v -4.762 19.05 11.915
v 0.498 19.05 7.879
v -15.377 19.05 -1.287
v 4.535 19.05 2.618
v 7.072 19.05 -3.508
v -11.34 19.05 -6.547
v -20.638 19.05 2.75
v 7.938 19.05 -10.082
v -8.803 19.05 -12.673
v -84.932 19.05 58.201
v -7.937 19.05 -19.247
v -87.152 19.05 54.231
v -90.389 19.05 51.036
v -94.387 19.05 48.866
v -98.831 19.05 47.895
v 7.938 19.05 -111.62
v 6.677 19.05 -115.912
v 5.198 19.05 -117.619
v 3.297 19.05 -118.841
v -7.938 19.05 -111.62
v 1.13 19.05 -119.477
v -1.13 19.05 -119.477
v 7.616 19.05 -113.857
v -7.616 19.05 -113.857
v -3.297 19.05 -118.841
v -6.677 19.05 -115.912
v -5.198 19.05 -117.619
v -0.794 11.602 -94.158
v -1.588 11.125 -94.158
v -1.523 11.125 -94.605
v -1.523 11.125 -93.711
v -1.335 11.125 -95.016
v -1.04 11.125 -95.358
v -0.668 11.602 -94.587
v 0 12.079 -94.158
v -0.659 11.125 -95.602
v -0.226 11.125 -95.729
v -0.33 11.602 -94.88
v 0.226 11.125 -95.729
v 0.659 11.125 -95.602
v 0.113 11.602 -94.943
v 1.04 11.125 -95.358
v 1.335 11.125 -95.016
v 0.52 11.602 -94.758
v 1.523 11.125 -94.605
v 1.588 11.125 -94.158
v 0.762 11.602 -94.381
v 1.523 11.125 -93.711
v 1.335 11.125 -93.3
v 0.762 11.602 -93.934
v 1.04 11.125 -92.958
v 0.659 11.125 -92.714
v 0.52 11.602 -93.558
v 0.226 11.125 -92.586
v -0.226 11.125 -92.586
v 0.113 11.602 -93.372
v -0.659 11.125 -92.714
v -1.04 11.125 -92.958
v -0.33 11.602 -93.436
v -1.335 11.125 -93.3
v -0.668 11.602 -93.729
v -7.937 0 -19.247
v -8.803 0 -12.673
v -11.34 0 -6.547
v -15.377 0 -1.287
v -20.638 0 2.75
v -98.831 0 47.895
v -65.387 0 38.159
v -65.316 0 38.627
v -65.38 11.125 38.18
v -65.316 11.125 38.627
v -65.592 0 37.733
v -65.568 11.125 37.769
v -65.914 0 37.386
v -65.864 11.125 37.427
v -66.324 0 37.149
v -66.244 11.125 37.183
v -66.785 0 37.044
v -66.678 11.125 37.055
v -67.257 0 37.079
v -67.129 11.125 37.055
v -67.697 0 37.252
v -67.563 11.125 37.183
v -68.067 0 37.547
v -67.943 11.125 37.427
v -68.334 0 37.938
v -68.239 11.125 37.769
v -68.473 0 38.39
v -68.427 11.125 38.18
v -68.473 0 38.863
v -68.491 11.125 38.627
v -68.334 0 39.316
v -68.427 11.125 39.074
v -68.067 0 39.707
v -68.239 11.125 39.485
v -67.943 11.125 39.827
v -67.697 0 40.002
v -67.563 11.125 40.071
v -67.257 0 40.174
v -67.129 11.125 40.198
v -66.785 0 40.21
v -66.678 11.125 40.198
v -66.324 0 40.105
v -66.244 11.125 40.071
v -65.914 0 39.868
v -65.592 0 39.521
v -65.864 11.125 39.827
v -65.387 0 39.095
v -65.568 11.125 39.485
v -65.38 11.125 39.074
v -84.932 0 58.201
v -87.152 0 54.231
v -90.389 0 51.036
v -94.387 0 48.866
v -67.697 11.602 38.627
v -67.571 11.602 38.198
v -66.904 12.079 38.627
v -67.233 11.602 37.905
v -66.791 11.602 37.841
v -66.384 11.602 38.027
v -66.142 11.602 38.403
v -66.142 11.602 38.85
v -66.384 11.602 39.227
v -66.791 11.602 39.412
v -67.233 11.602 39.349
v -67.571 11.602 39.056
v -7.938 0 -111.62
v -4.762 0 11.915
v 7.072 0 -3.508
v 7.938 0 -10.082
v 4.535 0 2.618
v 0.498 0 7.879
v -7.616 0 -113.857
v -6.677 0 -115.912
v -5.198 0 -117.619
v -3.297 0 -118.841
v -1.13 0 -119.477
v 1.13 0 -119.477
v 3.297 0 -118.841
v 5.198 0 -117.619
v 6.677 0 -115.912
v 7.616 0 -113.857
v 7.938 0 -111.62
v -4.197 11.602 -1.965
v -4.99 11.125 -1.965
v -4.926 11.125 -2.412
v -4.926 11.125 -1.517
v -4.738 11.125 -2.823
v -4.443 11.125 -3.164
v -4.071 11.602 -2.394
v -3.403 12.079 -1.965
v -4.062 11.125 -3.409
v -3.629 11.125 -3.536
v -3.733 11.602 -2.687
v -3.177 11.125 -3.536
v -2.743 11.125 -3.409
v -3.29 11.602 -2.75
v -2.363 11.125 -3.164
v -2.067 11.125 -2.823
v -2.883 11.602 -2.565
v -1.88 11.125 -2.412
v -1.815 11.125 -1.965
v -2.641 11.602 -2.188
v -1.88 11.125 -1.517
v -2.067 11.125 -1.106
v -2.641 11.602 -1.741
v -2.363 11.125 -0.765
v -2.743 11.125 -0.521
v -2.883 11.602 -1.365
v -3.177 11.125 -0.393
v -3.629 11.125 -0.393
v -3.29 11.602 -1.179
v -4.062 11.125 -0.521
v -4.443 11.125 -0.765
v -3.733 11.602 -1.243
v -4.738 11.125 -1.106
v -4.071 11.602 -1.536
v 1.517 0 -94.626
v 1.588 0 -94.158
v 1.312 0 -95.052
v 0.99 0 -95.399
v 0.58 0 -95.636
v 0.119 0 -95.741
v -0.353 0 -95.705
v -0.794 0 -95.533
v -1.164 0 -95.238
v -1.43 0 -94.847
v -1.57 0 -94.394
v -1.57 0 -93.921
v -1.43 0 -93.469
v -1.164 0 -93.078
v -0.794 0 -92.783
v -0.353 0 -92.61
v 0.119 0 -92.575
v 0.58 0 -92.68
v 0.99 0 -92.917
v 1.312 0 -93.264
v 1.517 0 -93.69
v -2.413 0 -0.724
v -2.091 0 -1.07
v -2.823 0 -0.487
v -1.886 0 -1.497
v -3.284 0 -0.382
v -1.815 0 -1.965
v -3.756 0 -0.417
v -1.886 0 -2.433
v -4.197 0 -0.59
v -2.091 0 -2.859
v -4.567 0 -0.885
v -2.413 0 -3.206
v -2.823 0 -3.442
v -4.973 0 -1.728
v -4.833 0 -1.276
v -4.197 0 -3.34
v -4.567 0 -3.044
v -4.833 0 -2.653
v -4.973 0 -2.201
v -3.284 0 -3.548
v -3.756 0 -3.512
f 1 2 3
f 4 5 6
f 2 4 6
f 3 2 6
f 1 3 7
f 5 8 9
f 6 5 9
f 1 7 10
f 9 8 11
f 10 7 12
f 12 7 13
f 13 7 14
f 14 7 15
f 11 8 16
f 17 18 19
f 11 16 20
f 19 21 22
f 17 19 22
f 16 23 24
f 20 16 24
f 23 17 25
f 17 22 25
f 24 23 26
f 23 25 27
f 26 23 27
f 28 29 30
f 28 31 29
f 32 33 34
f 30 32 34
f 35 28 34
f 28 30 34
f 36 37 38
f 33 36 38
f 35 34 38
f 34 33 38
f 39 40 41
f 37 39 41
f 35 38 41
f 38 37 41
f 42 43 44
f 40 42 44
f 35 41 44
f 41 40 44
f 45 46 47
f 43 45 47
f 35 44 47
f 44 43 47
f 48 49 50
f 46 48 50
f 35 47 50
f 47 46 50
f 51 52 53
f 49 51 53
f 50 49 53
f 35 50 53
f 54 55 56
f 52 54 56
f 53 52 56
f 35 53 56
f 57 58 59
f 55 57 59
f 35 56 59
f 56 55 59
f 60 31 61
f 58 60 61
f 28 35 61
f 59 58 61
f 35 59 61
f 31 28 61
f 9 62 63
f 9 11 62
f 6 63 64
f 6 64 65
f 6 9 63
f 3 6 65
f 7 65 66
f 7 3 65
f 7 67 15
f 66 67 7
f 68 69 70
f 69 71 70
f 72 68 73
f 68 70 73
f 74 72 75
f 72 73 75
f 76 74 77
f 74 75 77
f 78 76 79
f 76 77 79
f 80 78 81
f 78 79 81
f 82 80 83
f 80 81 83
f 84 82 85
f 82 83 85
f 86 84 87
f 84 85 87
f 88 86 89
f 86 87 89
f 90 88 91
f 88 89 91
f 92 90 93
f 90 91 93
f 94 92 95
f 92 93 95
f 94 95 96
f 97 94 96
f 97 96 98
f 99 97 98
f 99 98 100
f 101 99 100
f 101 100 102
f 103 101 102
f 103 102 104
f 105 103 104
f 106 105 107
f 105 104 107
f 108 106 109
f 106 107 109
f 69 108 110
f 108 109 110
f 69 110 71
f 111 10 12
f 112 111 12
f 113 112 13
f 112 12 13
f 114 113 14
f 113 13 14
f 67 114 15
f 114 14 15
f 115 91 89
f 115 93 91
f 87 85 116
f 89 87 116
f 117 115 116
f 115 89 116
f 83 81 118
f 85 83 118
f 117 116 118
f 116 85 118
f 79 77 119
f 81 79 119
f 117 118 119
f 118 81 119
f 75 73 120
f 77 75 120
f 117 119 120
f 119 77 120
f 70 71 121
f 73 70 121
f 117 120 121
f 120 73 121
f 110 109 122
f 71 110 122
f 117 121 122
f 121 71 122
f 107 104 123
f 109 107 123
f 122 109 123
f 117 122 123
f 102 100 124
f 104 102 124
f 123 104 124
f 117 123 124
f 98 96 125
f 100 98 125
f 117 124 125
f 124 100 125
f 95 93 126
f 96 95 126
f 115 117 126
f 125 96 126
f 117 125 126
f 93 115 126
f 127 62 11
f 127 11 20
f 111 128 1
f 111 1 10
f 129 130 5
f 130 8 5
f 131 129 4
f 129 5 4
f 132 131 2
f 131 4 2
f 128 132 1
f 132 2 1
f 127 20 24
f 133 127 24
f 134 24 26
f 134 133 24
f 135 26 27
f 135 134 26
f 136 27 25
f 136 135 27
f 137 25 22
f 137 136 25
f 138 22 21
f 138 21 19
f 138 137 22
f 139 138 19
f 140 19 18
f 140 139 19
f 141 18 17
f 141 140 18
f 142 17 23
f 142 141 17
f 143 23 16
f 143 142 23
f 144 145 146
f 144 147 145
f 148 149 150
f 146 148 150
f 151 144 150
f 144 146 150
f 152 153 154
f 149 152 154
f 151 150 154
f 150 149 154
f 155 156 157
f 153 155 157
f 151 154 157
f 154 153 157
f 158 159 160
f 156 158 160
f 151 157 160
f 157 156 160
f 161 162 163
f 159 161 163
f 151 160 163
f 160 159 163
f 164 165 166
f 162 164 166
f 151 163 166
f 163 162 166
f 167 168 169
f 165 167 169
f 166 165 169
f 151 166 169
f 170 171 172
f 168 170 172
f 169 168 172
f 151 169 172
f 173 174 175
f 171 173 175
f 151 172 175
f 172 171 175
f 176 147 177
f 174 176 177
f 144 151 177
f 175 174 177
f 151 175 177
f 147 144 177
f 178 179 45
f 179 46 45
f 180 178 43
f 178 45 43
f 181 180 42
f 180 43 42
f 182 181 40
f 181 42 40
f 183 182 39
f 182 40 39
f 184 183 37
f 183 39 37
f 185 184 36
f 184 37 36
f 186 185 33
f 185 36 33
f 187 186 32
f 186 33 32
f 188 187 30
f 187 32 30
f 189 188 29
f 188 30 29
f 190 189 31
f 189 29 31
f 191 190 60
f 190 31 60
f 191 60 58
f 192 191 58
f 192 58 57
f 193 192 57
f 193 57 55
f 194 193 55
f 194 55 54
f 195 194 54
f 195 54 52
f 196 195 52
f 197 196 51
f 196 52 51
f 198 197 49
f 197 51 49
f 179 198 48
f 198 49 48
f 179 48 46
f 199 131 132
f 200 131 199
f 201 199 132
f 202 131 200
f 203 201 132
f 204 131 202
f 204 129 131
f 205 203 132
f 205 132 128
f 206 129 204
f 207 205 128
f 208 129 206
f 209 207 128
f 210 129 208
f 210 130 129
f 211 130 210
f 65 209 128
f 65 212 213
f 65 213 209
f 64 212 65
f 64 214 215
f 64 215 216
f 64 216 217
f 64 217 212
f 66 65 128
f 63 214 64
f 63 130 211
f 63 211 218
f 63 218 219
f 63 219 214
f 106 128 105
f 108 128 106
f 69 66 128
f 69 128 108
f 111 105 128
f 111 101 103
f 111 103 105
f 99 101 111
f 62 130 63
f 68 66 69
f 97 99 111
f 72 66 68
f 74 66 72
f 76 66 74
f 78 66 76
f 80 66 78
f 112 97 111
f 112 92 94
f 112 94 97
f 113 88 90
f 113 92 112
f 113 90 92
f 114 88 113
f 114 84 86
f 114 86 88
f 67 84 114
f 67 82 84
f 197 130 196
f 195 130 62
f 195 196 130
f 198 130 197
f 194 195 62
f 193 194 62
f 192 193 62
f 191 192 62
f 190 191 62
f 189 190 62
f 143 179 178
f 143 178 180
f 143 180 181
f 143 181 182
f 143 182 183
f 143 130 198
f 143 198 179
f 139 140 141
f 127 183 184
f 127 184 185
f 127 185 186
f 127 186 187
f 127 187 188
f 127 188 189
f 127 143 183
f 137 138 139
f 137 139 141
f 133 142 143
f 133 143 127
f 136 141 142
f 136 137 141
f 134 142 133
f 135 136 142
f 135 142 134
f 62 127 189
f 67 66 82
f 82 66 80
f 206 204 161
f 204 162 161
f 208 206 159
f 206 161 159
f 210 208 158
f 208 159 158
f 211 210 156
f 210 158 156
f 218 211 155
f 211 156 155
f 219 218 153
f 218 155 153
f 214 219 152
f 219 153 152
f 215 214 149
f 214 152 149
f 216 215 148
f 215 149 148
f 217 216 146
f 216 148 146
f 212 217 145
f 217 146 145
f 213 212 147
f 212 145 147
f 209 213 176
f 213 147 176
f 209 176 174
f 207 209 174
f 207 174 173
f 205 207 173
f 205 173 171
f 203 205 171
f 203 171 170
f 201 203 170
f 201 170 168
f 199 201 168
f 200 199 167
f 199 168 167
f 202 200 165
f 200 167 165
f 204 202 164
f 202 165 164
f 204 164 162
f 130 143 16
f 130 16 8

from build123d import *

# Parameters (mm, degrees)
BOSS_EXTRUDE1_DEPTH              = 19.05
CUT_EXTRUDE1_DEPTH               = 159.823046871
FILLET1_R                        = 25.4
F_1_8_0_125_DIAMETER_HOLE1_D     = 3.175
F_1_8_0_125_DIAMETER_HOLE1_DEPTH = 11.1252
F_1_8_0_125_DIAMETER_HOLE1_TIP   = 0.953866233


with BuildPart() as part:
    # Sketch1 → Boss-Extrude1 (new body)
    with BuildSketch(Plane(origin=(0, 0, 0), x_dir=(1, 0, 0), z_dir=(0, 1, 0))):
        with BuildLine():
            Line((7.9375, 111.6203), (7.9375, -4.582717762))
            Line((7.9375, -4.582717762), (-90.893507667, -61.642826643))
            ThreePointArc((-90.893507667, -61.642826643), (-101.73633431, -58.7375), (-98.831007667, -47.894673357))
            Line((-98.831007667, -47.894673357), (-7.9375, 4.582717762))
            Line((-7.9375, 4.582717762), (-7.9375, 111.6203))
            ThreePointArc((-7.9375, 111.6203), (0, 119.5578), (7.9375, 111.6203))
        make_face()
    extrude(amount=BOSS_EXTRUDE1_DEPTH)

    # Sketch2 → Cut-Extrude1 (cut, through all)
    with BuildSketch(Plane(origin=(0, 19.05, 0), x_dir=(1, 0, 0), z_dir=(0, 1, 0))):
        with BuildLine():
            Line((-90.893507667, -61.642826643), (-84.931832215, -58.200851716))
            ThreePointArc((-84.931832215, -58.200851716), (-90.389422779, -51.035617044), (-98.831007667, -47.894673357))
            ThreePointArc((-98.831007667, -47.894673357), (-101.73633431, -58.7375), (-90.893507667, -61.642826643))
        make_face()
    extrude(amount=-CUT_EXTRUDE1_DEPTH, mode=Mode.SUBTRACT)

    # Fillet1
    fillet1_edges = [part.edges().sort_by_distance(p)[0] for p in [
        (7.9375, 9.525, 4.582717762),
        (-7.9375, 9.525, -4.582717762),
    ]]
    fillet(fillet1_edges, radius=FILLET1_R)

    # 1/8 (0.125) Diameter Hole1
    with Locations(Plane(origin=(0, 0, 0), x_dir=(-1, 0, 0), z_dir=(0, -1, 0))):
        with Locations((0, 94.1578), (66.903536959, -38.626775073), (3.402954744, 1.964696837)):
            Hole(F_1_8_0_125_DIAMETER_HOLE1_D / 2, depth=F_1_8_0_125_DIAMETER_HOLE1_DEPTH)
            with Locations((0, 0, -(F_1_8_0_125_DIAMETER_HOLE1_DEPTH + F_1_8_0_125_DIAMETER_HOLE1_TIP / 2))):  # 118° drill point
                Cone(0, F_1_8_0_125_DIAMETER_HOLE1_D / 2, F_1_8_0_125_DIAMETER_HOLE1_TIP, mode=Mode.SUBTRACT)


solid = part.part
